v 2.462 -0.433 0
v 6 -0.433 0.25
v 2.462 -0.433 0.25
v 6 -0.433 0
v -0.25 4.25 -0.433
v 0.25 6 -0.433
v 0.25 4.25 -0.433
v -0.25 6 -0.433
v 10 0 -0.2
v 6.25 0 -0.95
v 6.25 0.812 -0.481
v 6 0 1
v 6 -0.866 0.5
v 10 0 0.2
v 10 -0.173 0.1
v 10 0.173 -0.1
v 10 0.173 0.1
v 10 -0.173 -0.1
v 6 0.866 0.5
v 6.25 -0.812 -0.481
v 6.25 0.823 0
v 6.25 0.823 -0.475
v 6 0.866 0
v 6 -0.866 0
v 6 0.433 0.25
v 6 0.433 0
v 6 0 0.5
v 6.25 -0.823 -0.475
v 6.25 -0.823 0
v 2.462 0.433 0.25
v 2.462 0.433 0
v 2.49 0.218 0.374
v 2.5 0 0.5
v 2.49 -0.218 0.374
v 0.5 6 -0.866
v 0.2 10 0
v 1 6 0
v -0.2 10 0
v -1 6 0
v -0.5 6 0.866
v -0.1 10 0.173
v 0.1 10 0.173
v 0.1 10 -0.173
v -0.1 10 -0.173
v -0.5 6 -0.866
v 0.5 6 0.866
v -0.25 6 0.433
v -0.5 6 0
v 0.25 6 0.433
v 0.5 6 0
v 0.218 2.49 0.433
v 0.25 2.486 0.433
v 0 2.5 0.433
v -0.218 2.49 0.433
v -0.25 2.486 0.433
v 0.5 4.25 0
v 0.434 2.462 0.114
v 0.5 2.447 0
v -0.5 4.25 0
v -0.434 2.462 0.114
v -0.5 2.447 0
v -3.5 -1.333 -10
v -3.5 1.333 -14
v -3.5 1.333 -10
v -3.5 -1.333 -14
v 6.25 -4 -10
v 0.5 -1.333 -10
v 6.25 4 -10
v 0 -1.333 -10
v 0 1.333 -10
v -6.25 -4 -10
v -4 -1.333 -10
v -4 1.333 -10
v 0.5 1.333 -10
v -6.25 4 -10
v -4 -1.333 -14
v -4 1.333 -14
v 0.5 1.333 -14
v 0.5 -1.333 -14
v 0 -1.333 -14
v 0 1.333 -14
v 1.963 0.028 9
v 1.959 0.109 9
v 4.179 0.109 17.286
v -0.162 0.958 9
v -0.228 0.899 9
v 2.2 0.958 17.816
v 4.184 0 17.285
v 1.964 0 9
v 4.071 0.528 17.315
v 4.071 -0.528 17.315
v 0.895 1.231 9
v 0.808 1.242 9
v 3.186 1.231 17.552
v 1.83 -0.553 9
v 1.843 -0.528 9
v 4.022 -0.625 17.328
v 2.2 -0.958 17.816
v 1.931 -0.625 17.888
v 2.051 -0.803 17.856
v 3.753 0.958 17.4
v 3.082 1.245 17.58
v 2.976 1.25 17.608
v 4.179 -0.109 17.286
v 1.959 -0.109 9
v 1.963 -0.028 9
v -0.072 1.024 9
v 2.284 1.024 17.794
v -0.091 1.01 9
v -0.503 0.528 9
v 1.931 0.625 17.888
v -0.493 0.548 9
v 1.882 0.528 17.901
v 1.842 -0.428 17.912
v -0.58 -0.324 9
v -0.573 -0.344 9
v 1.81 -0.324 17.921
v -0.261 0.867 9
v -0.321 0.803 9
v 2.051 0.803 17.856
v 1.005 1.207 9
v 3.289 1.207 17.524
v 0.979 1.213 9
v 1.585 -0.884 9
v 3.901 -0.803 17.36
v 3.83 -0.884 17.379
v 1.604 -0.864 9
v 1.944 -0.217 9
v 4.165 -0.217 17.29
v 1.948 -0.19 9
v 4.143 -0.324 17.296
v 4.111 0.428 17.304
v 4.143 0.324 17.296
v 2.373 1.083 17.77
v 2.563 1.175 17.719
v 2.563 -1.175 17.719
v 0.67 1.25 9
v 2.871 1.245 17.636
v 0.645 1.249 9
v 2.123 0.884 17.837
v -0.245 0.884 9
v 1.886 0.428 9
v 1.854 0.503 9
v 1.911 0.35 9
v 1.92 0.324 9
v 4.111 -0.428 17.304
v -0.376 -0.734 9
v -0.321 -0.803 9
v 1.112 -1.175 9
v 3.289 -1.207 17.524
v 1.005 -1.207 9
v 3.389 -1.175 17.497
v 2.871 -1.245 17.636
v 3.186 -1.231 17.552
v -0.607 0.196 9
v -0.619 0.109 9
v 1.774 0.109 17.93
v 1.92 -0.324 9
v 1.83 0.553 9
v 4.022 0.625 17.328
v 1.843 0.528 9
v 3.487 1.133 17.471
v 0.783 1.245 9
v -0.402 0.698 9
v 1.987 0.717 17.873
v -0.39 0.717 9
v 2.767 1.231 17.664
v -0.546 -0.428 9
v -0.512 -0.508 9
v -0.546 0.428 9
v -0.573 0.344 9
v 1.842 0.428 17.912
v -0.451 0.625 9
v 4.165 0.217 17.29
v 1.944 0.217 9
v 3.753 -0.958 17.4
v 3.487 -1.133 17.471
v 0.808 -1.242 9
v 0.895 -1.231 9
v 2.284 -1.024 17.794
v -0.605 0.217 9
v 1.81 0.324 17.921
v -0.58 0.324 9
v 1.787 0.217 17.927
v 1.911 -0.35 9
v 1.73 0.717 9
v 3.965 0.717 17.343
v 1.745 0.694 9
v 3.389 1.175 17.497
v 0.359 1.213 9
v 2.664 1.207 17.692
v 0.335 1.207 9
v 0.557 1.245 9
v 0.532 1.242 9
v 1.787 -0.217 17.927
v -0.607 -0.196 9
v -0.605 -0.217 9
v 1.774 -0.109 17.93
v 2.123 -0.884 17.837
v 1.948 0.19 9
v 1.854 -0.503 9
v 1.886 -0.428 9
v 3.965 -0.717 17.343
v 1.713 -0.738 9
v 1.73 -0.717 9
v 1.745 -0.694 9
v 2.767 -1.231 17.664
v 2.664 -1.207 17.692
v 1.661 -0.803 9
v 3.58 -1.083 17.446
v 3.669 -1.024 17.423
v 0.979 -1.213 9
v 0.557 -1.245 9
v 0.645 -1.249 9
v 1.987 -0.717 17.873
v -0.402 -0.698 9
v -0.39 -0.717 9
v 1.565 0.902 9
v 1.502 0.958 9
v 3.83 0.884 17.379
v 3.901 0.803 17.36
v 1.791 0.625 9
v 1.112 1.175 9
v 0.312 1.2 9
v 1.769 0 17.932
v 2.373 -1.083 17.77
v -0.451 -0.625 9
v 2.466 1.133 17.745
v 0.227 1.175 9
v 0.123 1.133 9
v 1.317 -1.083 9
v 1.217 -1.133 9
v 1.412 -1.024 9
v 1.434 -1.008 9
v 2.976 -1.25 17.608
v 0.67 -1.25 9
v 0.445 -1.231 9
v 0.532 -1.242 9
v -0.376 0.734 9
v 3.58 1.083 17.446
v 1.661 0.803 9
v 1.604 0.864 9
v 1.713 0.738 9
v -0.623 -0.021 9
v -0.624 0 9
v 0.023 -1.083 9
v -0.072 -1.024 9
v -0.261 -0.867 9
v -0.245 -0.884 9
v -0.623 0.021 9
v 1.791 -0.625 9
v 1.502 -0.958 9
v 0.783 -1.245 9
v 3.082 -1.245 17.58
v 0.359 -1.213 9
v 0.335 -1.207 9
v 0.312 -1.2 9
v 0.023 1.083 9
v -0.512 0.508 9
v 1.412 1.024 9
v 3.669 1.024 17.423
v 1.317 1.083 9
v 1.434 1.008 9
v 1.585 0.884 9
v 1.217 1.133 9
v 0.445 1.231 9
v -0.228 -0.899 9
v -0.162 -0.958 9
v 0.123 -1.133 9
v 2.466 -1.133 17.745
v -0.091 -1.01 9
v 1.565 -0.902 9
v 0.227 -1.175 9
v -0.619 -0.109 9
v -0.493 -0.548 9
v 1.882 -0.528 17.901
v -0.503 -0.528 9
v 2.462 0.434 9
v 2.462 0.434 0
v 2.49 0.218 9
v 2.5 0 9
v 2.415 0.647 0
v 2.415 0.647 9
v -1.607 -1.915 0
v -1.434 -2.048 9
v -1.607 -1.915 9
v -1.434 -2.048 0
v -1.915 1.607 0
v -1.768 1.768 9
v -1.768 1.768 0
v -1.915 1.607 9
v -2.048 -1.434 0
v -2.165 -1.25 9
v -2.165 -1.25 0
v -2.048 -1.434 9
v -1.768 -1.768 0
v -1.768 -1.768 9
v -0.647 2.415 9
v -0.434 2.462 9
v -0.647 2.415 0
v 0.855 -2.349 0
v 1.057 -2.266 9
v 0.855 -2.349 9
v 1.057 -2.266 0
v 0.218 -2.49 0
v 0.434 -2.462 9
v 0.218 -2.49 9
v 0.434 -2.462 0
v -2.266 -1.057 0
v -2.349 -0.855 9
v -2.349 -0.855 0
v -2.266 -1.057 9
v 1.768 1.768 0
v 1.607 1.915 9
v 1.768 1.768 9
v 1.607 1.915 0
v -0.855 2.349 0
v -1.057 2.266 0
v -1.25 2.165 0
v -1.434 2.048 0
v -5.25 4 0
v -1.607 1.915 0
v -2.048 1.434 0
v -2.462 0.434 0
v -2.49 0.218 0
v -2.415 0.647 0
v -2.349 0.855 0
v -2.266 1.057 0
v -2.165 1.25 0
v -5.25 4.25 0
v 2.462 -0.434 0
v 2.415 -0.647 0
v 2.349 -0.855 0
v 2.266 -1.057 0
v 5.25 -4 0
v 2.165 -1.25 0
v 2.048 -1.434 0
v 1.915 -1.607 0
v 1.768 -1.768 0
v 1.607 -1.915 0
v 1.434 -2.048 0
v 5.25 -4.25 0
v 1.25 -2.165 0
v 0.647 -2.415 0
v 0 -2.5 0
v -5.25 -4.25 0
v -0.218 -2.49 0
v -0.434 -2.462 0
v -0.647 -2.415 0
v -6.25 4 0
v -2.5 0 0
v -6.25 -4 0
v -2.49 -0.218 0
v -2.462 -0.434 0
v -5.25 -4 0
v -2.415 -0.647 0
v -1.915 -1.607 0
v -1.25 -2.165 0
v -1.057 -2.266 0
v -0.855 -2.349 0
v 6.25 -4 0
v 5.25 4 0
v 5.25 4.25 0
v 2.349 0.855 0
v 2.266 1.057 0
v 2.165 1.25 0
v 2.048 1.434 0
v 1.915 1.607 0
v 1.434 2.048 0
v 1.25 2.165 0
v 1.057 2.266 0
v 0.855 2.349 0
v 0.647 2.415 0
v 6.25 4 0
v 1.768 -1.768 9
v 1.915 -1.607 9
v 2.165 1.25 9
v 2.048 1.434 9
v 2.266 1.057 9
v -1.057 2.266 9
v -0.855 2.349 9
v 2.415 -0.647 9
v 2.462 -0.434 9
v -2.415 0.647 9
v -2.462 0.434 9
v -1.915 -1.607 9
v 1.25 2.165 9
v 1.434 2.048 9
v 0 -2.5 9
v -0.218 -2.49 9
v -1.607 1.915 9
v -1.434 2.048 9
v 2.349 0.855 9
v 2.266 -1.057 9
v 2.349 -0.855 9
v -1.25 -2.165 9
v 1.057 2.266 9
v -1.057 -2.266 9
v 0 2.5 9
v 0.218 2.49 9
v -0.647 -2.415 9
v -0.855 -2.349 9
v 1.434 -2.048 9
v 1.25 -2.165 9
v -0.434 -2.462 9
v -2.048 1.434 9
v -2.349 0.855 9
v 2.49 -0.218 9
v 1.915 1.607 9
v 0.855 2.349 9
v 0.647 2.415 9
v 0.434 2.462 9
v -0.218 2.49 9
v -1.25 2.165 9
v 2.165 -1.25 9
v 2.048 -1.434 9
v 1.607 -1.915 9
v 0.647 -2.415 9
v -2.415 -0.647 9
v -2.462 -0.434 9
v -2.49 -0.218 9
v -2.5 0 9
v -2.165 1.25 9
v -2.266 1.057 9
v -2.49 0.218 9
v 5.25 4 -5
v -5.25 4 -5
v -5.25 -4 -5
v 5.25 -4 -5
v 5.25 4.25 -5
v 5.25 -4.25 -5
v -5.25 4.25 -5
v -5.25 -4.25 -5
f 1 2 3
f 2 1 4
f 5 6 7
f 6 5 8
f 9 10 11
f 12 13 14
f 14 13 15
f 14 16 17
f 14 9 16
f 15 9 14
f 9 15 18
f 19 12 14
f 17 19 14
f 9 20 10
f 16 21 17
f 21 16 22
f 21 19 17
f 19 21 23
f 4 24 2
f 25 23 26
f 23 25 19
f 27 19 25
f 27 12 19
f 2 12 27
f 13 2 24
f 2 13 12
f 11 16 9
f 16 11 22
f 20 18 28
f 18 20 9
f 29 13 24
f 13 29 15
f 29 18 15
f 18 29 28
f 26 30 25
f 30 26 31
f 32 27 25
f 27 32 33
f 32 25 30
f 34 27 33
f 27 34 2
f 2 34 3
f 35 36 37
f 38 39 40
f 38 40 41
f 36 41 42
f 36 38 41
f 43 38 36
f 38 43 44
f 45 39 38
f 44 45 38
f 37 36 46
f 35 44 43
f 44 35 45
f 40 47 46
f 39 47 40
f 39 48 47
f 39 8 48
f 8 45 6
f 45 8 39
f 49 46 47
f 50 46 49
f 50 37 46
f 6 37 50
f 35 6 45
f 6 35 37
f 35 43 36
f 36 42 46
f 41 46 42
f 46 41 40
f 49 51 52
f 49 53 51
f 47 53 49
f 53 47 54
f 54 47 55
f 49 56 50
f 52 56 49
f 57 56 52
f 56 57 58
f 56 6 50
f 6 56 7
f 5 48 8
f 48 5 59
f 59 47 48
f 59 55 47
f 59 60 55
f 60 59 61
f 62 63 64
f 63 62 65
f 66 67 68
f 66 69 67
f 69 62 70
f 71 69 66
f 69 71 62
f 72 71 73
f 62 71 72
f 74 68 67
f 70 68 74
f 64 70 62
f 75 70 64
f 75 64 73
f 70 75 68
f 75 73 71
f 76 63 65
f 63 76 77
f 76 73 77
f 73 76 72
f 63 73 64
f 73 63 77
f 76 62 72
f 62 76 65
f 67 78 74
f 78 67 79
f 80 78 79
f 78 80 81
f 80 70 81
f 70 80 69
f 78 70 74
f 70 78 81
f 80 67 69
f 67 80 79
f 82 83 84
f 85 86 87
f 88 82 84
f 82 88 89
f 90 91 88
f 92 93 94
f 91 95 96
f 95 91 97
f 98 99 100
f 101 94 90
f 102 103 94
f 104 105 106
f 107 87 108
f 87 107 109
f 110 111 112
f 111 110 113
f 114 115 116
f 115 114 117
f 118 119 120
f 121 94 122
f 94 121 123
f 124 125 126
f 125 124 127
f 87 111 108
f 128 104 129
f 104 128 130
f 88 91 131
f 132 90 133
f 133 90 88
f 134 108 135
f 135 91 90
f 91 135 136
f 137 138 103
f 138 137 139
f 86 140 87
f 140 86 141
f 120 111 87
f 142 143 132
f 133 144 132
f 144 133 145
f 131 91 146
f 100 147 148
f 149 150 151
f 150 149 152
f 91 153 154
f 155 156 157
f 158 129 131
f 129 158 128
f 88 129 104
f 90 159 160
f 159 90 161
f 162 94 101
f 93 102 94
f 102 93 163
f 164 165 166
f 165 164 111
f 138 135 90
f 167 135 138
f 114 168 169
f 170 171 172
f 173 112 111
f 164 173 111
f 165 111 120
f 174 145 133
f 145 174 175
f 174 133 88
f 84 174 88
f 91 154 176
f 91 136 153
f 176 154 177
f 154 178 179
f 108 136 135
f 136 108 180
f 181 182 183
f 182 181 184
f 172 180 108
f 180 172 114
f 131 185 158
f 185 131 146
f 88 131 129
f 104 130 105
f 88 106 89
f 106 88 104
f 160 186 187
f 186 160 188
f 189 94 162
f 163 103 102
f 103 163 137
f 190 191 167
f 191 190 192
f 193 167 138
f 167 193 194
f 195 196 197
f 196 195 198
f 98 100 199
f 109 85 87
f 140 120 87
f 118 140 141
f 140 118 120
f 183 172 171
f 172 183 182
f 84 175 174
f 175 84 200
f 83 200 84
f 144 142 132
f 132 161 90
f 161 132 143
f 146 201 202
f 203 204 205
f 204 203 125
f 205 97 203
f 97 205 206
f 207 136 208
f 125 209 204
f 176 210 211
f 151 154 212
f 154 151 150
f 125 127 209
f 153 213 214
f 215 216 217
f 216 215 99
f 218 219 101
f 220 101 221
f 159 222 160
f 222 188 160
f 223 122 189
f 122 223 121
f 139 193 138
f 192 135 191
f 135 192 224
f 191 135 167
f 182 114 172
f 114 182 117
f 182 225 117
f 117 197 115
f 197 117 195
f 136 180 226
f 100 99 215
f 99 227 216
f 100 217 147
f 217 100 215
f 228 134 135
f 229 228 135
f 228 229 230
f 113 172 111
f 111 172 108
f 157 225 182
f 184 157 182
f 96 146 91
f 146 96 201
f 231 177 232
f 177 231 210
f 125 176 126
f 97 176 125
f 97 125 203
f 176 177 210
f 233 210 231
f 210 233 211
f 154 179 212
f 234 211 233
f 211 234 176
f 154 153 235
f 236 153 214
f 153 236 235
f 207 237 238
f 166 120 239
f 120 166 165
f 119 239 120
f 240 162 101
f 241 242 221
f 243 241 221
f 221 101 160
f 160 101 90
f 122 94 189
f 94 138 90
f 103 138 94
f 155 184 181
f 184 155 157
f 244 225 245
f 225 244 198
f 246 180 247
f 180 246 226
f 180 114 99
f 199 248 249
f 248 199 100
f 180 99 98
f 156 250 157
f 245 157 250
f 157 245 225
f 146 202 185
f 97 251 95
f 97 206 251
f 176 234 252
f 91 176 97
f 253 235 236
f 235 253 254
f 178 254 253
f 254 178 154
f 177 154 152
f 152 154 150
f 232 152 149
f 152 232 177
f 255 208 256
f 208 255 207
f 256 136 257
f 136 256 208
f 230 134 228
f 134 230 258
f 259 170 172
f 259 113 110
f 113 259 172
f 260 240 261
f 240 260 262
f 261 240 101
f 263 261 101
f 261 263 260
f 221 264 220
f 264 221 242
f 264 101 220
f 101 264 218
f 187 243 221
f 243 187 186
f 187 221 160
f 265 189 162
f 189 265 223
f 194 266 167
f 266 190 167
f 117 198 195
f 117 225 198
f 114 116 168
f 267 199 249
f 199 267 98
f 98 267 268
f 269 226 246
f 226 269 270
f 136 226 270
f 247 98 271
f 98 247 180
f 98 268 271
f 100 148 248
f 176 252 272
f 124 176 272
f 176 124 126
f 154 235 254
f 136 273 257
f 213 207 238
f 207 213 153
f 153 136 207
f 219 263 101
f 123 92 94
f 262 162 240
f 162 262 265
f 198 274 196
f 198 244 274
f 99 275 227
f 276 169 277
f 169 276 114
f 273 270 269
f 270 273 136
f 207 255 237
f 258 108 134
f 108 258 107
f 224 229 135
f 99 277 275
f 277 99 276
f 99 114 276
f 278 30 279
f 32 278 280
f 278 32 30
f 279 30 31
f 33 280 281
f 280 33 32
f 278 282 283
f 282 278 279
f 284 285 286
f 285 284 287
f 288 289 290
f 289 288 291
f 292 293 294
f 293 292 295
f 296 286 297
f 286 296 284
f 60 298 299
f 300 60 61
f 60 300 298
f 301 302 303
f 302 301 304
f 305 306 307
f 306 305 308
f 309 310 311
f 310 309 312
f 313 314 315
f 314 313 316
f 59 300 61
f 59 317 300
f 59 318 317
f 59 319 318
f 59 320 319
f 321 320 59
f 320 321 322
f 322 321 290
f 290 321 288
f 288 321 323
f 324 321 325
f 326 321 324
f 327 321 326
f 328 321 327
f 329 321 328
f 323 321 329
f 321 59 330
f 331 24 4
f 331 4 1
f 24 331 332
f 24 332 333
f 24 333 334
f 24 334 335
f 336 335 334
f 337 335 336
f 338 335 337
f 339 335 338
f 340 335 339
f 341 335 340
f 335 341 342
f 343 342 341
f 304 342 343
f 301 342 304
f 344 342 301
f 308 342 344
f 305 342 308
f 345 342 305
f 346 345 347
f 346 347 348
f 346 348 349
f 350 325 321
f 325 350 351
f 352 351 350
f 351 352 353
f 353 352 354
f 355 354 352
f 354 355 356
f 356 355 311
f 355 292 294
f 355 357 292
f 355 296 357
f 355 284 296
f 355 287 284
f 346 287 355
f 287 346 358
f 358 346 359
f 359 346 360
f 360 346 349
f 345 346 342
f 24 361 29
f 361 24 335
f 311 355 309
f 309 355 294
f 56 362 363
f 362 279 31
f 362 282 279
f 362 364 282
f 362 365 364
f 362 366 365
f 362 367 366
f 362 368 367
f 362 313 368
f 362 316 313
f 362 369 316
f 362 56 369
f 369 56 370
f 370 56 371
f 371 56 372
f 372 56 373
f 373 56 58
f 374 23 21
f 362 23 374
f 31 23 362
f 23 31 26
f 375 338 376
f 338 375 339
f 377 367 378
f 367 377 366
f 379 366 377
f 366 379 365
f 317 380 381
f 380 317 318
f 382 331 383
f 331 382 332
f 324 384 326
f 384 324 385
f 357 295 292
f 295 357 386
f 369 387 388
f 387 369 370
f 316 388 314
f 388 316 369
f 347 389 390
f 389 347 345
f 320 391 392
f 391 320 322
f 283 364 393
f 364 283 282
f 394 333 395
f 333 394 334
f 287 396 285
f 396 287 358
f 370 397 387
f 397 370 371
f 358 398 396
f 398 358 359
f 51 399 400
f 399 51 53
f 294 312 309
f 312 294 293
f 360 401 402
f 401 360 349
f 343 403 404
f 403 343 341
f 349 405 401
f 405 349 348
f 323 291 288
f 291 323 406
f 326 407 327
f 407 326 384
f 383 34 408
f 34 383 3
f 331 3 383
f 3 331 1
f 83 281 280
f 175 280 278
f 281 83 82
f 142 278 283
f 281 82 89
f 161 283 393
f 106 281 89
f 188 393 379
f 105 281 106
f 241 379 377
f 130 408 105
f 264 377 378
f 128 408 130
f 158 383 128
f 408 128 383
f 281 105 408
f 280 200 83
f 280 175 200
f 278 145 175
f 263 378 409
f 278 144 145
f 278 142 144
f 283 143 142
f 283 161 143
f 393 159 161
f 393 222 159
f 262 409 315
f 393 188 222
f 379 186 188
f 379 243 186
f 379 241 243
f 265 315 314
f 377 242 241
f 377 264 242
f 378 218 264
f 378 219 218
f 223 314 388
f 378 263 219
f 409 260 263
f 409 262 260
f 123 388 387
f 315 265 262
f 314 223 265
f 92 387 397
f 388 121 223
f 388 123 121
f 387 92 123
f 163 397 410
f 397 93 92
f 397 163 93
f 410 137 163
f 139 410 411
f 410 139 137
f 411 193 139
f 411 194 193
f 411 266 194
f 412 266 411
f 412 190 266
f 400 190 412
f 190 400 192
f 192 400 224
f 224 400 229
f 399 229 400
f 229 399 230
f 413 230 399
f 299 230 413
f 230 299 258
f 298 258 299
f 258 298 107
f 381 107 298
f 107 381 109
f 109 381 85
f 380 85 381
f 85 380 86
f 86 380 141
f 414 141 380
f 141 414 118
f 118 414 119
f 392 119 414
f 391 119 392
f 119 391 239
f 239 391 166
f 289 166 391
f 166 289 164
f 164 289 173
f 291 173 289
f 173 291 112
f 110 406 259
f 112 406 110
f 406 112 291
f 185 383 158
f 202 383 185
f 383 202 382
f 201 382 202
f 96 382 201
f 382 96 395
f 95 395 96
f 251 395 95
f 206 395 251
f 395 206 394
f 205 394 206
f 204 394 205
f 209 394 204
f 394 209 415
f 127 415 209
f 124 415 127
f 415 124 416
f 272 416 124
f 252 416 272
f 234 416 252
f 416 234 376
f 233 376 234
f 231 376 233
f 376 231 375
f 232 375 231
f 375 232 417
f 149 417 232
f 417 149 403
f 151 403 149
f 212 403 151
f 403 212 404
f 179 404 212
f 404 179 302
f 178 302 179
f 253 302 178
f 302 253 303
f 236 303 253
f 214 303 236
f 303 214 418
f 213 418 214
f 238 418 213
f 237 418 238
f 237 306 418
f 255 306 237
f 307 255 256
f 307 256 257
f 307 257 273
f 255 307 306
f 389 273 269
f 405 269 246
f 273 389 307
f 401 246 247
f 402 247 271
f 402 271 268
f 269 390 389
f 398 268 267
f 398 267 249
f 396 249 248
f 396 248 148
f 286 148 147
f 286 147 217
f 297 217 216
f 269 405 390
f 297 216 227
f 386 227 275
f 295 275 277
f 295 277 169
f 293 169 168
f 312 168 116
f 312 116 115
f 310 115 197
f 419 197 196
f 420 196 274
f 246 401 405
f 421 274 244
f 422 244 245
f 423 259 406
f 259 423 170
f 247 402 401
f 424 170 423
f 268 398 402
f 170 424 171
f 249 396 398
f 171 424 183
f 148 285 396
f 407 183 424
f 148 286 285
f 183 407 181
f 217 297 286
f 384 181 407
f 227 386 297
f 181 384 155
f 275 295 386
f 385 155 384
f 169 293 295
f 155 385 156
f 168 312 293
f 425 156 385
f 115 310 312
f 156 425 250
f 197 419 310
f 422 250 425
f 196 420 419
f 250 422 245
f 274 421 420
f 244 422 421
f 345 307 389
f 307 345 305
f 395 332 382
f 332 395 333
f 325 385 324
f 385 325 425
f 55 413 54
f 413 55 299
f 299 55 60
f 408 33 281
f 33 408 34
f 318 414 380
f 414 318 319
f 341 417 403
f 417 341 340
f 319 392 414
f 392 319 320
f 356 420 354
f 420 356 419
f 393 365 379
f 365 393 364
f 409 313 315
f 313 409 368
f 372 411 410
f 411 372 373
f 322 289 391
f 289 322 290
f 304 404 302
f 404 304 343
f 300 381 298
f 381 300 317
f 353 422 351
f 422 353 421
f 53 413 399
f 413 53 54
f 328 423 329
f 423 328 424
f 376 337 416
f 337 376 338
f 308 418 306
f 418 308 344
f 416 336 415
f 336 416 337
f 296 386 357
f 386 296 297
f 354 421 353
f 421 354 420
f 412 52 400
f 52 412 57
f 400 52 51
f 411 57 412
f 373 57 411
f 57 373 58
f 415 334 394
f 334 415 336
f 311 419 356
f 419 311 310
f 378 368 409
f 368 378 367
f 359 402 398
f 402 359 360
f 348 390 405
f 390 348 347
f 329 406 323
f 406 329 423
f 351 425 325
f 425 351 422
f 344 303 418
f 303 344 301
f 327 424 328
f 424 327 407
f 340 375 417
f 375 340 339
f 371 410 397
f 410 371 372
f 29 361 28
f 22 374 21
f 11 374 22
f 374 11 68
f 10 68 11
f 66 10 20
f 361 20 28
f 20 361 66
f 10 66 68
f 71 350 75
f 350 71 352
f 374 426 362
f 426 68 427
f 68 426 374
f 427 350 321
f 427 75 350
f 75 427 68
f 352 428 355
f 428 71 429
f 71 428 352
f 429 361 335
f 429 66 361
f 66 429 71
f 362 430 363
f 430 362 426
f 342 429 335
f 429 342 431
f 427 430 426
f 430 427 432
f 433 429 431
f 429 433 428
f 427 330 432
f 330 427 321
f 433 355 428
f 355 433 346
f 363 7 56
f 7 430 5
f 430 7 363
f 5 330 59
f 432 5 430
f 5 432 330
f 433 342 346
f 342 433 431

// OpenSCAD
include <../config/config.scad>
UseSTL=false;
UseVitaminSTL=false;
DebugConnectors=true;
DebugCoordinateFrames=true;
MiniToggleSwitch();
